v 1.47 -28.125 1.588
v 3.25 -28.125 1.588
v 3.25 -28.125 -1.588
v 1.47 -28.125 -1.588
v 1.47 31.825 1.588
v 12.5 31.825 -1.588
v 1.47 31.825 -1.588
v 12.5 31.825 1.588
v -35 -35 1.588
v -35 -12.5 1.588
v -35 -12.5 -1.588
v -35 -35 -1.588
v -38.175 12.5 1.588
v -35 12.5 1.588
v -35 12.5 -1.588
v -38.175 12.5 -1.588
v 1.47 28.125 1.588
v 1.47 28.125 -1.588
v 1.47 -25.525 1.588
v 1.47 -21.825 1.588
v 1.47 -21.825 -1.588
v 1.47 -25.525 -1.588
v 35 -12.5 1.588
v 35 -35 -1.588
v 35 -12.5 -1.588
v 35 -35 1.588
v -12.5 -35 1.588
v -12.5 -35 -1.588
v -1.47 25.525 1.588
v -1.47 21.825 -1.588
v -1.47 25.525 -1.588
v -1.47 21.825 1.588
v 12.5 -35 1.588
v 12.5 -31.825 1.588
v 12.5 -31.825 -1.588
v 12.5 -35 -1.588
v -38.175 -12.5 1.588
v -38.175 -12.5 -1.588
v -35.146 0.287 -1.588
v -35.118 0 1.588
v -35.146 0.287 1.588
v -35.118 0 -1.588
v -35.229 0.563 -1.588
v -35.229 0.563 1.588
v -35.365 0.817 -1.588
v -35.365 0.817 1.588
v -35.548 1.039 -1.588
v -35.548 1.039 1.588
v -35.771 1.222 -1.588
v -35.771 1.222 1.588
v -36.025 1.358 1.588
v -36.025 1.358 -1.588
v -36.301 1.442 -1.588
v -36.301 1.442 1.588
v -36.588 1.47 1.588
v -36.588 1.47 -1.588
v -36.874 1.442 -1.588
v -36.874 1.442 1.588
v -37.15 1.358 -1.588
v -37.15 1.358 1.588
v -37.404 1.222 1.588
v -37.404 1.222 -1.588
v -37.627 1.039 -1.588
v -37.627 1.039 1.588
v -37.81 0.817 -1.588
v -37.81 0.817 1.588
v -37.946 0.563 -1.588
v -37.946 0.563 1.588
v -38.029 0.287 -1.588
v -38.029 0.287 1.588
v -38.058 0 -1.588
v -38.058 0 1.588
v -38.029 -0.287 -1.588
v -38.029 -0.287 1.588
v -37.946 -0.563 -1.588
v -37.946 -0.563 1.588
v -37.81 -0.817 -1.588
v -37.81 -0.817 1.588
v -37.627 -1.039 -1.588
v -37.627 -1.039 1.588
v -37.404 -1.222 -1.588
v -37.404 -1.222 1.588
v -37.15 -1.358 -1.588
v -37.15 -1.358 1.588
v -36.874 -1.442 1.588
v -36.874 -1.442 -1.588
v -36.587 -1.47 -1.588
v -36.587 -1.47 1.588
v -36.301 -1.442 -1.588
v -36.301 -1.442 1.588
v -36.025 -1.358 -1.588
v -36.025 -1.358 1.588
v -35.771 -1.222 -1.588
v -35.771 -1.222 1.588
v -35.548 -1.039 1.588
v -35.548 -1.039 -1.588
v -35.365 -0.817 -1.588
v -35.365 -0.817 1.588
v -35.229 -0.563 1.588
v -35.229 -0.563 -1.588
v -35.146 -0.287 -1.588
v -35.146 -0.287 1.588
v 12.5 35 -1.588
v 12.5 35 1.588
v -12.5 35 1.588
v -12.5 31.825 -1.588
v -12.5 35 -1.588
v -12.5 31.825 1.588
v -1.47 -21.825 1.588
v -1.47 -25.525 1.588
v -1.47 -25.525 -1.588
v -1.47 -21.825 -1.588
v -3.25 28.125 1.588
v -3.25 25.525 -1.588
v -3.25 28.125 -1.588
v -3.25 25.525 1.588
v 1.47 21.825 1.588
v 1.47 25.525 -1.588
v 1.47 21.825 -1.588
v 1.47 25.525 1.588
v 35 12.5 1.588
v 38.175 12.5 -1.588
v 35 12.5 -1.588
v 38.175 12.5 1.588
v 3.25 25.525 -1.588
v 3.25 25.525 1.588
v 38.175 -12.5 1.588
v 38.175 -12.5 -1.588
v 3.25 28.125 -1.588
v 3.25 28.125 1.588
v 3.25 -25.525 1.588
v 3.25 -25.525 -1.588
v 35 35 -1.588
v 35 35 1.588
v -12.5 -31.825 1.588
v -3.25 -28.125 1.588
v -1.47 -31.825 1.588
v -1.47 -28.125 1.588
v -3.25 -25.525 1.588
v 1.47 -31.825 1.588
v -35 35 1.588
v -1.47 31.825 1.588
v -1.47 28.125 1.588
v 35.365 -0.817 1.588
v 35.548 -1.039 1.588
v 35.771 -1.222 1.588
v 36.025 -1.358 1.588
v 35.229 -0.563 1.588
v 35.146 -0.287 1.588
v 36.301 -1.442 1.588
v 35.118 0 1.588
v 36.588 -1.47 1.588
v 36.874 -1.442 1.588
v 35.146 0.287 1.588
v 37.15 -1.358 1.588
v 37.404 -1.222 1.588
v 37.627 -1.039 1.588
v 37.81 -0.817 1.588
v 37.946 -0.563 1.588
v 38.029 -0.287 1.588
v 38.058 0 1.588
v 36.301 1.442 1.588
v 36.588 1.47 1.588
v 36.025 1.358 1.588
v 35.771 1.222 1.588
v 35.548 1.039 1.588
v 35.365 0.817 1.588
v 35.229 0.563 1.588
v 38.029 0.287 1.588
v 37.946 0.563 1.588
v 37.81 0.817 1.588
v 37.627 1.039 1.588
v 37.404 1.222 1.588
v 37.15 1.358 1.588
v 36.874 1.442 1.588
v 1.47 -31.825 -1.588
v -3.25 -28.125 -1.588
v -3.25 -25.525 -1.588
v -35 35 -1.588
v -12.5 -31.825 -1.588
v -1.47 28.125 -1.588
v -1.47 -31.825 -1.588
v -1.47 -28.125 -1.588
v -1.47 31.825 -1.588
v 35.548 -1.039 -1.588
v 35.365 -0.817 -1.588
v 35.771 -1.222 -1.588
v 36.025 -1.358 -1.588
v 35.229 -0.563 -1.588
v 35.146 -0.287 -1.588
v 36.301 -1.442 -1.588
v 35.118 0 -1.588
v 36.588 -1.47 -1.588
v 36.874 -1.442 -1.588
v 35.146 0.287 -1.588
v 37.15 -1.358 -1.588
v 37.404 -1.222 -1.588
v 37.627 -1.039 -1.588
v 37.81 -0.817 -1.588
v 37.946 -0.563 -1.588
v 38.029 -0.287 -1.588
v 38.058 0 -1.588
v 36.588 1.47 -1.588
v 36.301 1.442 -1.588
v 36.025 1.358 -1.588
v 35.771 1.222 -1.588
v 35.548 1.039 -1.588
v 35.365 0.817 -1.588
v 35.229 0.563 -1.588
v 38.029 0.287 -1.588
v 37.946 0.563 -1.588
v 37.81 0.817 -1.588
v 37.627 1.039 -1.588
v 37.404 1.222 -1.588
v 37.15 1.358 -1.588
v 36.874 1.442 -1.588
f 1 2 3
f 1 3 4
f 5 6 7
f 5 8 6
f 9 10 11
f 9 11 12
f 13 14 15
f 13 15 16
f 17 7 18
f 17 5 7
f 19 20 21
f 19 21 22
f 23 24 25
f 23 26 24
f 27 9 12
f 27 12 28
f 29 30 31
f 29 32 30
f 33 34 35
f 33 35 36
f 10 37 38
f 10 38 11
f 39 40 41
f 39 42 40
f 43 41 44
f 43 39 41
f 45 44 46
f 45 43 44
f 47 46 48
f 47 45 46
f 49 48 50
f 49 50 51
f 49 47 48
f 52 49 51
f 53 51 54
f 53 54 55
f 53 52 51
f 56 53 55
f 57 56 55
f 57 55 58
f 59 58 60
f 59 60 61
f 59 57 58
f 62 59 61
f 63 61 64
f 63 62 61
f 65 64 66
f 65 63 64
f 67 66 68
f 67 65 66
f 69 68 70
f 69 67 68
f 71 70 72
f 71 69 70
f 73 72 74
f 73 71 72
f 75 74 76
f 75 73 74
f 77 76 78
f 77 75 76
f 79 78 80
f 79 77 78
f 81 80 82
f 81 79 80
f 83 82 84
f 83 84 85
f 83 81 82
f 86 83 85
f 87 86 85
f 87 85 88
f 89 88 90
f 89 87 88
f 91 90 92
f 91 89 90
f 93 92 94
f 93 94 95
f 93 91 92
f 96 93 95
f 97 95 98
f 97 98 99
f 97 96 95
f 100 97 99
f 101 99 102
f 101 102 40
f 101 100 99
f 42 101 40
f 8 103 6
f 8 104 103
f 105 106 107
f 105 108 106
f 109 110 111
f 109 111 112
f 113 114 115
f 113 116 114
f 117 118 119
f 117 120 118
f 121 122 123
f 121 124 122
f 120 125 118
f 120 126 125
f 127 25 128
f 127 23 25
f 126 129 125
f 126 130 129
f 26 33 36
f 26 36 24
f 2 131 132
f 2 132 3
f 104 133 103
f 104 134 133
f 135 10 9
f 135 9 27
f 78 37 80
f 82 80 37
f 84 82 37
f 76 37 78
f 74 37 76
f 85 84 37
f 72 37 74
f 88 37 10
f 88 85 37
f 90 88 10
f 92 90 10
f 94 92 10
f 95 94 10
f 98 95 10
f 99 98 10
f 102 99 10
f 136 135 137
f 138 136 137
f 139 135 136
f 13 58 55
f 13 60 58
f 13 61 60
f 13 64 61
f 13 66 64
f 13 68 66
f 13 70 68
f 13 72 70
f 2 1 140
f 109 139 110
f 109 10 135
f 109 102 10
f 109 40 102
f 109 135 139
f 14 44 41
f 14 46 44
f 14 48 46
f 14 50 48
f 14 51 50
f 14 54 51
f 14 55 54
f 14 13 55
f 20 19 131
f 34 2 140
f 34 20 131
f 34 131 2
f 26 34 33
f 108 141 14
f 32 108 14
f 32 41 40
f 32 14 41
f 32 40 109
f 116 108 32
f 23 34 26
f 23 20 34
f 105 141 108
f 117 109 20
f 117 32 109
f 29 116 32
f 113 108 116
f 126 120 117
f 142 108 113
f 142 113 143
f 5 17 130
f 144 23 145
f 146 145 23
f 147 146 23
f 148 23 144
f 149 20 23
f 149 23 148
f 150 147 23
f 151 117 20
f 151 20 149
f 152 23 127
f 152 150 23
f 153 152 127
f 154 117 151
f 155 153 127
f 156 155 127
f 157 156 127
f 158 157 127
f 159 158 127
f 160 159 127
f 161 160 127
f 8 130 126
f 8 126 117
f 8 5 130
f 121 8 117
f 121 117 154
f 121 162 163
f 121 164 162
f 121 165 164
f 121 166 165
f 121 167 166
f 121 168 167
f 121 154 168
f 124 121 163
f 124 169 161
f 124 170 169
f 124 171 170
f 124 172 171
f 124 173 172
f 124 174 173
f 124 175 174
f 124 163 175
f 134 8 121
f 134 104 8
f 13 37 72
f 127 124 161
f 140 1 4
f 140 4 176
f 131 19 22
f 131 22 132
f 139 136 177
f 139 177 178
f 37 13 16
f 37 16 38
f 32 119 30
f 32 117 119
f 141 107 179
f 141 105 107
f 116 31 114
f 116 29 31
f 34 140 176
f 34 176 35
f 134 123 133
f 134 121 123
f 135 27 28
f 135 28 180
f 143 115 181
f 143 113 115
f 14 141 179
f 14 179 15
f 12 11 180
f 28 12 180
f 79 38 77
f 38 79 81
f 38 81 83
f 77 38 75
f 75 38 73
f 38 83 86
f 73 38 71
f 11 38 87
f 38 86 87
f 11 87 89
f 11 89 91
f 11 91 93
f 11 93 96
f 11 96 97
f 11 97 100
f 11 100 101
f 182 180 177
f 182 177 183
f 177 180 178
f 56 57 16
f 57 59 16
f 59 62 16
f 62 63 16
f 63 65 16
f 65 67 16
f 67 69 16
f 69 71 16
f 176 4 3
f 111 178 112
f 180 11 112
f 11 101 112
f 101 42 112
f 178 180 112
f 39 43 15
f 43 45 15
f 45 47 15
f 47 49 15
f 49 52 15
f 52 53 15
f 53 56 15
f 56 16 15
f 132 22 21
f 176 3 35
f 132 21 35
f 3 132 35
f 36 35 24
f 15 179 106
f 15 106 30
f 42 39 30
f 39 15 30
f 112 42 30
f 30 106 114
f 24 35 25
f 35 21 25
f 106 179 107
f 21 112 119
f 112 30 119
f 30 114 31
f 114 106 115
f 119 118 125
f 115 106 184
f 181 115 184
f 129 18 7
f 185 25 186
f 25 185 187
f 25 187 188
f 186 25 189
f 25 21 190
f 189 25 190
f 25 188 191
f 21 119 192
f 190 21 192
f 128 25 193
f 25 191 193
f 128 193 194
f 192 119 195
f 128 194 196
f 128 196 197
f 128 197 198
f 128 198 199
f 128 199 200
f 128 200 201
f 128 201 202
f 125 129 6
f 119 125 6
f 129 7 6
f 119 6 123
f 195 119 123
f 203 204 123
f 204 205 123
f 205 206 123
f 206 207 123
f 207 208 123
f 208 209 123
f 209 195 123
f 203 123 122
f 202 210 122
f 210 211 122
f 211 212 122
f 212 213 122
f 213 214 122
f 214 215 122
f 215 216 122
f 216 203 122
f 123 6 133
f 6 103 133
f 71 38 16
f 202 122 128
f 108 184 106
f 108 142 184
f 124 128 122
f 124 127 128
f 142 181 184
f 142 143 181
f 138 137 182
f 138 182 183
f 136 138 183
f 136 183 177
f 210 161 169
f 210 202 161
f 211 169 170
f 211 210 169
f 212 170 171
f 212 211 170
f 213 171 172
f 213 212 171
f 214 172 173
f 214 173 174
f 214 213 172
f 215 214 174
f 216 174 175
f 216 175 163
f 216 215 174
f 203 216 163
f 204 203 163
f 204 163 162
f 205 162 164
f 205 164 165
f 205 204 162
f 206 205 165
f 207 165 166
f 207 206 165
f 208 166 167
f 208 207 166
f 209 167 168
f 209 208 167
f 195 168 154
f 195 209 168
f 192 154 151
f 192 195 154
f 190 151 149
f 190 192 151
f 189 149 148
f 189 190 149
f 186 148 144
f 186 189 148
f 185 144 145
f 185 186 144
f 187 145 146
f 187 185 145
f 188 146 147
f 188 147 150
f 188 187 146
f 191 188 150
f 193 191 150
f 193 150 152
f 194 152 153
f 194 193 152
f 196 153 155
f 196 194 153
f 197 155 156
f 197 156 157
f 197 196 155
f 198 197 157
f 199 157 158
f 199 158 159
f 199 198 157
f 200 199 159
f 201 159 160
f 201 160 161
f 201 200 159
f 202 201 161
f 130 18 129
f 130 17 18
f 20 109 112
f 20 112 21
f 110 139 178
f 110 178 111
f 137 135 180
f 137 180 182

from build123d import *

# Parameters (mm, degrees)
SKETCH1_R           = 1.47
BOSS_EXTRUDE1_DEPTH = 1.5875


with BuildPart() as part:
    # Sketch1 → Boss-Extrude1 (new body, symmetric)
    with BuildSketch(Plane.XY):
        Polygon((-12.5, 35), (-35, 35), (-35, 12.5), (-38.175, 12.5), (-38.175, -12.5), (-35, -12.5), (-35, -35), (-12.5, -35), (-12.5, -31.825), (-1.47, -31.825), (-1.47, -28.125), (-3.25, -28.125), (-3.25, -25.525), (-1.47, -25.525), (-1.47, -21.825), (1.47, -21.825), (1.47, -25.525), (3.25, -25.525), (3.25, -28.125), (1.47, -28.125), (1.47, -31.825), (12.5, -31.825), (12.5, -35), (35, -35), (35, -12.5), (38.175, -12.5), (38.175, 12.5), (35, 12.5), (35, 35), (12.5, 35), (12.5, 31.825), (1.47, 31.825), (1.47, 28.125), (3.25, 28.125), (3.25, 25.525), (1.47, 25.525), (1.47, 21.825), (-1.47, 21.825), (-1.47, 25.525), (-3.25, 25.525), (-3.25, 28.125), (-1.47, 28.125), (-1.47, 31.825), (-12.5, 31.825), align=None)
        with Locations((-36.5875, 0)):
            Circle(SKETCH1_R, mode=Mode.SUBTRACT)
        with Locations((36.5875, 0)):
            Circle(SKETCH1_R, mode=Mode.SUBTRACT)
    extrude(amount=BOSS_EXTRUDE1_DEPTH, both=True)


solid = part.part
